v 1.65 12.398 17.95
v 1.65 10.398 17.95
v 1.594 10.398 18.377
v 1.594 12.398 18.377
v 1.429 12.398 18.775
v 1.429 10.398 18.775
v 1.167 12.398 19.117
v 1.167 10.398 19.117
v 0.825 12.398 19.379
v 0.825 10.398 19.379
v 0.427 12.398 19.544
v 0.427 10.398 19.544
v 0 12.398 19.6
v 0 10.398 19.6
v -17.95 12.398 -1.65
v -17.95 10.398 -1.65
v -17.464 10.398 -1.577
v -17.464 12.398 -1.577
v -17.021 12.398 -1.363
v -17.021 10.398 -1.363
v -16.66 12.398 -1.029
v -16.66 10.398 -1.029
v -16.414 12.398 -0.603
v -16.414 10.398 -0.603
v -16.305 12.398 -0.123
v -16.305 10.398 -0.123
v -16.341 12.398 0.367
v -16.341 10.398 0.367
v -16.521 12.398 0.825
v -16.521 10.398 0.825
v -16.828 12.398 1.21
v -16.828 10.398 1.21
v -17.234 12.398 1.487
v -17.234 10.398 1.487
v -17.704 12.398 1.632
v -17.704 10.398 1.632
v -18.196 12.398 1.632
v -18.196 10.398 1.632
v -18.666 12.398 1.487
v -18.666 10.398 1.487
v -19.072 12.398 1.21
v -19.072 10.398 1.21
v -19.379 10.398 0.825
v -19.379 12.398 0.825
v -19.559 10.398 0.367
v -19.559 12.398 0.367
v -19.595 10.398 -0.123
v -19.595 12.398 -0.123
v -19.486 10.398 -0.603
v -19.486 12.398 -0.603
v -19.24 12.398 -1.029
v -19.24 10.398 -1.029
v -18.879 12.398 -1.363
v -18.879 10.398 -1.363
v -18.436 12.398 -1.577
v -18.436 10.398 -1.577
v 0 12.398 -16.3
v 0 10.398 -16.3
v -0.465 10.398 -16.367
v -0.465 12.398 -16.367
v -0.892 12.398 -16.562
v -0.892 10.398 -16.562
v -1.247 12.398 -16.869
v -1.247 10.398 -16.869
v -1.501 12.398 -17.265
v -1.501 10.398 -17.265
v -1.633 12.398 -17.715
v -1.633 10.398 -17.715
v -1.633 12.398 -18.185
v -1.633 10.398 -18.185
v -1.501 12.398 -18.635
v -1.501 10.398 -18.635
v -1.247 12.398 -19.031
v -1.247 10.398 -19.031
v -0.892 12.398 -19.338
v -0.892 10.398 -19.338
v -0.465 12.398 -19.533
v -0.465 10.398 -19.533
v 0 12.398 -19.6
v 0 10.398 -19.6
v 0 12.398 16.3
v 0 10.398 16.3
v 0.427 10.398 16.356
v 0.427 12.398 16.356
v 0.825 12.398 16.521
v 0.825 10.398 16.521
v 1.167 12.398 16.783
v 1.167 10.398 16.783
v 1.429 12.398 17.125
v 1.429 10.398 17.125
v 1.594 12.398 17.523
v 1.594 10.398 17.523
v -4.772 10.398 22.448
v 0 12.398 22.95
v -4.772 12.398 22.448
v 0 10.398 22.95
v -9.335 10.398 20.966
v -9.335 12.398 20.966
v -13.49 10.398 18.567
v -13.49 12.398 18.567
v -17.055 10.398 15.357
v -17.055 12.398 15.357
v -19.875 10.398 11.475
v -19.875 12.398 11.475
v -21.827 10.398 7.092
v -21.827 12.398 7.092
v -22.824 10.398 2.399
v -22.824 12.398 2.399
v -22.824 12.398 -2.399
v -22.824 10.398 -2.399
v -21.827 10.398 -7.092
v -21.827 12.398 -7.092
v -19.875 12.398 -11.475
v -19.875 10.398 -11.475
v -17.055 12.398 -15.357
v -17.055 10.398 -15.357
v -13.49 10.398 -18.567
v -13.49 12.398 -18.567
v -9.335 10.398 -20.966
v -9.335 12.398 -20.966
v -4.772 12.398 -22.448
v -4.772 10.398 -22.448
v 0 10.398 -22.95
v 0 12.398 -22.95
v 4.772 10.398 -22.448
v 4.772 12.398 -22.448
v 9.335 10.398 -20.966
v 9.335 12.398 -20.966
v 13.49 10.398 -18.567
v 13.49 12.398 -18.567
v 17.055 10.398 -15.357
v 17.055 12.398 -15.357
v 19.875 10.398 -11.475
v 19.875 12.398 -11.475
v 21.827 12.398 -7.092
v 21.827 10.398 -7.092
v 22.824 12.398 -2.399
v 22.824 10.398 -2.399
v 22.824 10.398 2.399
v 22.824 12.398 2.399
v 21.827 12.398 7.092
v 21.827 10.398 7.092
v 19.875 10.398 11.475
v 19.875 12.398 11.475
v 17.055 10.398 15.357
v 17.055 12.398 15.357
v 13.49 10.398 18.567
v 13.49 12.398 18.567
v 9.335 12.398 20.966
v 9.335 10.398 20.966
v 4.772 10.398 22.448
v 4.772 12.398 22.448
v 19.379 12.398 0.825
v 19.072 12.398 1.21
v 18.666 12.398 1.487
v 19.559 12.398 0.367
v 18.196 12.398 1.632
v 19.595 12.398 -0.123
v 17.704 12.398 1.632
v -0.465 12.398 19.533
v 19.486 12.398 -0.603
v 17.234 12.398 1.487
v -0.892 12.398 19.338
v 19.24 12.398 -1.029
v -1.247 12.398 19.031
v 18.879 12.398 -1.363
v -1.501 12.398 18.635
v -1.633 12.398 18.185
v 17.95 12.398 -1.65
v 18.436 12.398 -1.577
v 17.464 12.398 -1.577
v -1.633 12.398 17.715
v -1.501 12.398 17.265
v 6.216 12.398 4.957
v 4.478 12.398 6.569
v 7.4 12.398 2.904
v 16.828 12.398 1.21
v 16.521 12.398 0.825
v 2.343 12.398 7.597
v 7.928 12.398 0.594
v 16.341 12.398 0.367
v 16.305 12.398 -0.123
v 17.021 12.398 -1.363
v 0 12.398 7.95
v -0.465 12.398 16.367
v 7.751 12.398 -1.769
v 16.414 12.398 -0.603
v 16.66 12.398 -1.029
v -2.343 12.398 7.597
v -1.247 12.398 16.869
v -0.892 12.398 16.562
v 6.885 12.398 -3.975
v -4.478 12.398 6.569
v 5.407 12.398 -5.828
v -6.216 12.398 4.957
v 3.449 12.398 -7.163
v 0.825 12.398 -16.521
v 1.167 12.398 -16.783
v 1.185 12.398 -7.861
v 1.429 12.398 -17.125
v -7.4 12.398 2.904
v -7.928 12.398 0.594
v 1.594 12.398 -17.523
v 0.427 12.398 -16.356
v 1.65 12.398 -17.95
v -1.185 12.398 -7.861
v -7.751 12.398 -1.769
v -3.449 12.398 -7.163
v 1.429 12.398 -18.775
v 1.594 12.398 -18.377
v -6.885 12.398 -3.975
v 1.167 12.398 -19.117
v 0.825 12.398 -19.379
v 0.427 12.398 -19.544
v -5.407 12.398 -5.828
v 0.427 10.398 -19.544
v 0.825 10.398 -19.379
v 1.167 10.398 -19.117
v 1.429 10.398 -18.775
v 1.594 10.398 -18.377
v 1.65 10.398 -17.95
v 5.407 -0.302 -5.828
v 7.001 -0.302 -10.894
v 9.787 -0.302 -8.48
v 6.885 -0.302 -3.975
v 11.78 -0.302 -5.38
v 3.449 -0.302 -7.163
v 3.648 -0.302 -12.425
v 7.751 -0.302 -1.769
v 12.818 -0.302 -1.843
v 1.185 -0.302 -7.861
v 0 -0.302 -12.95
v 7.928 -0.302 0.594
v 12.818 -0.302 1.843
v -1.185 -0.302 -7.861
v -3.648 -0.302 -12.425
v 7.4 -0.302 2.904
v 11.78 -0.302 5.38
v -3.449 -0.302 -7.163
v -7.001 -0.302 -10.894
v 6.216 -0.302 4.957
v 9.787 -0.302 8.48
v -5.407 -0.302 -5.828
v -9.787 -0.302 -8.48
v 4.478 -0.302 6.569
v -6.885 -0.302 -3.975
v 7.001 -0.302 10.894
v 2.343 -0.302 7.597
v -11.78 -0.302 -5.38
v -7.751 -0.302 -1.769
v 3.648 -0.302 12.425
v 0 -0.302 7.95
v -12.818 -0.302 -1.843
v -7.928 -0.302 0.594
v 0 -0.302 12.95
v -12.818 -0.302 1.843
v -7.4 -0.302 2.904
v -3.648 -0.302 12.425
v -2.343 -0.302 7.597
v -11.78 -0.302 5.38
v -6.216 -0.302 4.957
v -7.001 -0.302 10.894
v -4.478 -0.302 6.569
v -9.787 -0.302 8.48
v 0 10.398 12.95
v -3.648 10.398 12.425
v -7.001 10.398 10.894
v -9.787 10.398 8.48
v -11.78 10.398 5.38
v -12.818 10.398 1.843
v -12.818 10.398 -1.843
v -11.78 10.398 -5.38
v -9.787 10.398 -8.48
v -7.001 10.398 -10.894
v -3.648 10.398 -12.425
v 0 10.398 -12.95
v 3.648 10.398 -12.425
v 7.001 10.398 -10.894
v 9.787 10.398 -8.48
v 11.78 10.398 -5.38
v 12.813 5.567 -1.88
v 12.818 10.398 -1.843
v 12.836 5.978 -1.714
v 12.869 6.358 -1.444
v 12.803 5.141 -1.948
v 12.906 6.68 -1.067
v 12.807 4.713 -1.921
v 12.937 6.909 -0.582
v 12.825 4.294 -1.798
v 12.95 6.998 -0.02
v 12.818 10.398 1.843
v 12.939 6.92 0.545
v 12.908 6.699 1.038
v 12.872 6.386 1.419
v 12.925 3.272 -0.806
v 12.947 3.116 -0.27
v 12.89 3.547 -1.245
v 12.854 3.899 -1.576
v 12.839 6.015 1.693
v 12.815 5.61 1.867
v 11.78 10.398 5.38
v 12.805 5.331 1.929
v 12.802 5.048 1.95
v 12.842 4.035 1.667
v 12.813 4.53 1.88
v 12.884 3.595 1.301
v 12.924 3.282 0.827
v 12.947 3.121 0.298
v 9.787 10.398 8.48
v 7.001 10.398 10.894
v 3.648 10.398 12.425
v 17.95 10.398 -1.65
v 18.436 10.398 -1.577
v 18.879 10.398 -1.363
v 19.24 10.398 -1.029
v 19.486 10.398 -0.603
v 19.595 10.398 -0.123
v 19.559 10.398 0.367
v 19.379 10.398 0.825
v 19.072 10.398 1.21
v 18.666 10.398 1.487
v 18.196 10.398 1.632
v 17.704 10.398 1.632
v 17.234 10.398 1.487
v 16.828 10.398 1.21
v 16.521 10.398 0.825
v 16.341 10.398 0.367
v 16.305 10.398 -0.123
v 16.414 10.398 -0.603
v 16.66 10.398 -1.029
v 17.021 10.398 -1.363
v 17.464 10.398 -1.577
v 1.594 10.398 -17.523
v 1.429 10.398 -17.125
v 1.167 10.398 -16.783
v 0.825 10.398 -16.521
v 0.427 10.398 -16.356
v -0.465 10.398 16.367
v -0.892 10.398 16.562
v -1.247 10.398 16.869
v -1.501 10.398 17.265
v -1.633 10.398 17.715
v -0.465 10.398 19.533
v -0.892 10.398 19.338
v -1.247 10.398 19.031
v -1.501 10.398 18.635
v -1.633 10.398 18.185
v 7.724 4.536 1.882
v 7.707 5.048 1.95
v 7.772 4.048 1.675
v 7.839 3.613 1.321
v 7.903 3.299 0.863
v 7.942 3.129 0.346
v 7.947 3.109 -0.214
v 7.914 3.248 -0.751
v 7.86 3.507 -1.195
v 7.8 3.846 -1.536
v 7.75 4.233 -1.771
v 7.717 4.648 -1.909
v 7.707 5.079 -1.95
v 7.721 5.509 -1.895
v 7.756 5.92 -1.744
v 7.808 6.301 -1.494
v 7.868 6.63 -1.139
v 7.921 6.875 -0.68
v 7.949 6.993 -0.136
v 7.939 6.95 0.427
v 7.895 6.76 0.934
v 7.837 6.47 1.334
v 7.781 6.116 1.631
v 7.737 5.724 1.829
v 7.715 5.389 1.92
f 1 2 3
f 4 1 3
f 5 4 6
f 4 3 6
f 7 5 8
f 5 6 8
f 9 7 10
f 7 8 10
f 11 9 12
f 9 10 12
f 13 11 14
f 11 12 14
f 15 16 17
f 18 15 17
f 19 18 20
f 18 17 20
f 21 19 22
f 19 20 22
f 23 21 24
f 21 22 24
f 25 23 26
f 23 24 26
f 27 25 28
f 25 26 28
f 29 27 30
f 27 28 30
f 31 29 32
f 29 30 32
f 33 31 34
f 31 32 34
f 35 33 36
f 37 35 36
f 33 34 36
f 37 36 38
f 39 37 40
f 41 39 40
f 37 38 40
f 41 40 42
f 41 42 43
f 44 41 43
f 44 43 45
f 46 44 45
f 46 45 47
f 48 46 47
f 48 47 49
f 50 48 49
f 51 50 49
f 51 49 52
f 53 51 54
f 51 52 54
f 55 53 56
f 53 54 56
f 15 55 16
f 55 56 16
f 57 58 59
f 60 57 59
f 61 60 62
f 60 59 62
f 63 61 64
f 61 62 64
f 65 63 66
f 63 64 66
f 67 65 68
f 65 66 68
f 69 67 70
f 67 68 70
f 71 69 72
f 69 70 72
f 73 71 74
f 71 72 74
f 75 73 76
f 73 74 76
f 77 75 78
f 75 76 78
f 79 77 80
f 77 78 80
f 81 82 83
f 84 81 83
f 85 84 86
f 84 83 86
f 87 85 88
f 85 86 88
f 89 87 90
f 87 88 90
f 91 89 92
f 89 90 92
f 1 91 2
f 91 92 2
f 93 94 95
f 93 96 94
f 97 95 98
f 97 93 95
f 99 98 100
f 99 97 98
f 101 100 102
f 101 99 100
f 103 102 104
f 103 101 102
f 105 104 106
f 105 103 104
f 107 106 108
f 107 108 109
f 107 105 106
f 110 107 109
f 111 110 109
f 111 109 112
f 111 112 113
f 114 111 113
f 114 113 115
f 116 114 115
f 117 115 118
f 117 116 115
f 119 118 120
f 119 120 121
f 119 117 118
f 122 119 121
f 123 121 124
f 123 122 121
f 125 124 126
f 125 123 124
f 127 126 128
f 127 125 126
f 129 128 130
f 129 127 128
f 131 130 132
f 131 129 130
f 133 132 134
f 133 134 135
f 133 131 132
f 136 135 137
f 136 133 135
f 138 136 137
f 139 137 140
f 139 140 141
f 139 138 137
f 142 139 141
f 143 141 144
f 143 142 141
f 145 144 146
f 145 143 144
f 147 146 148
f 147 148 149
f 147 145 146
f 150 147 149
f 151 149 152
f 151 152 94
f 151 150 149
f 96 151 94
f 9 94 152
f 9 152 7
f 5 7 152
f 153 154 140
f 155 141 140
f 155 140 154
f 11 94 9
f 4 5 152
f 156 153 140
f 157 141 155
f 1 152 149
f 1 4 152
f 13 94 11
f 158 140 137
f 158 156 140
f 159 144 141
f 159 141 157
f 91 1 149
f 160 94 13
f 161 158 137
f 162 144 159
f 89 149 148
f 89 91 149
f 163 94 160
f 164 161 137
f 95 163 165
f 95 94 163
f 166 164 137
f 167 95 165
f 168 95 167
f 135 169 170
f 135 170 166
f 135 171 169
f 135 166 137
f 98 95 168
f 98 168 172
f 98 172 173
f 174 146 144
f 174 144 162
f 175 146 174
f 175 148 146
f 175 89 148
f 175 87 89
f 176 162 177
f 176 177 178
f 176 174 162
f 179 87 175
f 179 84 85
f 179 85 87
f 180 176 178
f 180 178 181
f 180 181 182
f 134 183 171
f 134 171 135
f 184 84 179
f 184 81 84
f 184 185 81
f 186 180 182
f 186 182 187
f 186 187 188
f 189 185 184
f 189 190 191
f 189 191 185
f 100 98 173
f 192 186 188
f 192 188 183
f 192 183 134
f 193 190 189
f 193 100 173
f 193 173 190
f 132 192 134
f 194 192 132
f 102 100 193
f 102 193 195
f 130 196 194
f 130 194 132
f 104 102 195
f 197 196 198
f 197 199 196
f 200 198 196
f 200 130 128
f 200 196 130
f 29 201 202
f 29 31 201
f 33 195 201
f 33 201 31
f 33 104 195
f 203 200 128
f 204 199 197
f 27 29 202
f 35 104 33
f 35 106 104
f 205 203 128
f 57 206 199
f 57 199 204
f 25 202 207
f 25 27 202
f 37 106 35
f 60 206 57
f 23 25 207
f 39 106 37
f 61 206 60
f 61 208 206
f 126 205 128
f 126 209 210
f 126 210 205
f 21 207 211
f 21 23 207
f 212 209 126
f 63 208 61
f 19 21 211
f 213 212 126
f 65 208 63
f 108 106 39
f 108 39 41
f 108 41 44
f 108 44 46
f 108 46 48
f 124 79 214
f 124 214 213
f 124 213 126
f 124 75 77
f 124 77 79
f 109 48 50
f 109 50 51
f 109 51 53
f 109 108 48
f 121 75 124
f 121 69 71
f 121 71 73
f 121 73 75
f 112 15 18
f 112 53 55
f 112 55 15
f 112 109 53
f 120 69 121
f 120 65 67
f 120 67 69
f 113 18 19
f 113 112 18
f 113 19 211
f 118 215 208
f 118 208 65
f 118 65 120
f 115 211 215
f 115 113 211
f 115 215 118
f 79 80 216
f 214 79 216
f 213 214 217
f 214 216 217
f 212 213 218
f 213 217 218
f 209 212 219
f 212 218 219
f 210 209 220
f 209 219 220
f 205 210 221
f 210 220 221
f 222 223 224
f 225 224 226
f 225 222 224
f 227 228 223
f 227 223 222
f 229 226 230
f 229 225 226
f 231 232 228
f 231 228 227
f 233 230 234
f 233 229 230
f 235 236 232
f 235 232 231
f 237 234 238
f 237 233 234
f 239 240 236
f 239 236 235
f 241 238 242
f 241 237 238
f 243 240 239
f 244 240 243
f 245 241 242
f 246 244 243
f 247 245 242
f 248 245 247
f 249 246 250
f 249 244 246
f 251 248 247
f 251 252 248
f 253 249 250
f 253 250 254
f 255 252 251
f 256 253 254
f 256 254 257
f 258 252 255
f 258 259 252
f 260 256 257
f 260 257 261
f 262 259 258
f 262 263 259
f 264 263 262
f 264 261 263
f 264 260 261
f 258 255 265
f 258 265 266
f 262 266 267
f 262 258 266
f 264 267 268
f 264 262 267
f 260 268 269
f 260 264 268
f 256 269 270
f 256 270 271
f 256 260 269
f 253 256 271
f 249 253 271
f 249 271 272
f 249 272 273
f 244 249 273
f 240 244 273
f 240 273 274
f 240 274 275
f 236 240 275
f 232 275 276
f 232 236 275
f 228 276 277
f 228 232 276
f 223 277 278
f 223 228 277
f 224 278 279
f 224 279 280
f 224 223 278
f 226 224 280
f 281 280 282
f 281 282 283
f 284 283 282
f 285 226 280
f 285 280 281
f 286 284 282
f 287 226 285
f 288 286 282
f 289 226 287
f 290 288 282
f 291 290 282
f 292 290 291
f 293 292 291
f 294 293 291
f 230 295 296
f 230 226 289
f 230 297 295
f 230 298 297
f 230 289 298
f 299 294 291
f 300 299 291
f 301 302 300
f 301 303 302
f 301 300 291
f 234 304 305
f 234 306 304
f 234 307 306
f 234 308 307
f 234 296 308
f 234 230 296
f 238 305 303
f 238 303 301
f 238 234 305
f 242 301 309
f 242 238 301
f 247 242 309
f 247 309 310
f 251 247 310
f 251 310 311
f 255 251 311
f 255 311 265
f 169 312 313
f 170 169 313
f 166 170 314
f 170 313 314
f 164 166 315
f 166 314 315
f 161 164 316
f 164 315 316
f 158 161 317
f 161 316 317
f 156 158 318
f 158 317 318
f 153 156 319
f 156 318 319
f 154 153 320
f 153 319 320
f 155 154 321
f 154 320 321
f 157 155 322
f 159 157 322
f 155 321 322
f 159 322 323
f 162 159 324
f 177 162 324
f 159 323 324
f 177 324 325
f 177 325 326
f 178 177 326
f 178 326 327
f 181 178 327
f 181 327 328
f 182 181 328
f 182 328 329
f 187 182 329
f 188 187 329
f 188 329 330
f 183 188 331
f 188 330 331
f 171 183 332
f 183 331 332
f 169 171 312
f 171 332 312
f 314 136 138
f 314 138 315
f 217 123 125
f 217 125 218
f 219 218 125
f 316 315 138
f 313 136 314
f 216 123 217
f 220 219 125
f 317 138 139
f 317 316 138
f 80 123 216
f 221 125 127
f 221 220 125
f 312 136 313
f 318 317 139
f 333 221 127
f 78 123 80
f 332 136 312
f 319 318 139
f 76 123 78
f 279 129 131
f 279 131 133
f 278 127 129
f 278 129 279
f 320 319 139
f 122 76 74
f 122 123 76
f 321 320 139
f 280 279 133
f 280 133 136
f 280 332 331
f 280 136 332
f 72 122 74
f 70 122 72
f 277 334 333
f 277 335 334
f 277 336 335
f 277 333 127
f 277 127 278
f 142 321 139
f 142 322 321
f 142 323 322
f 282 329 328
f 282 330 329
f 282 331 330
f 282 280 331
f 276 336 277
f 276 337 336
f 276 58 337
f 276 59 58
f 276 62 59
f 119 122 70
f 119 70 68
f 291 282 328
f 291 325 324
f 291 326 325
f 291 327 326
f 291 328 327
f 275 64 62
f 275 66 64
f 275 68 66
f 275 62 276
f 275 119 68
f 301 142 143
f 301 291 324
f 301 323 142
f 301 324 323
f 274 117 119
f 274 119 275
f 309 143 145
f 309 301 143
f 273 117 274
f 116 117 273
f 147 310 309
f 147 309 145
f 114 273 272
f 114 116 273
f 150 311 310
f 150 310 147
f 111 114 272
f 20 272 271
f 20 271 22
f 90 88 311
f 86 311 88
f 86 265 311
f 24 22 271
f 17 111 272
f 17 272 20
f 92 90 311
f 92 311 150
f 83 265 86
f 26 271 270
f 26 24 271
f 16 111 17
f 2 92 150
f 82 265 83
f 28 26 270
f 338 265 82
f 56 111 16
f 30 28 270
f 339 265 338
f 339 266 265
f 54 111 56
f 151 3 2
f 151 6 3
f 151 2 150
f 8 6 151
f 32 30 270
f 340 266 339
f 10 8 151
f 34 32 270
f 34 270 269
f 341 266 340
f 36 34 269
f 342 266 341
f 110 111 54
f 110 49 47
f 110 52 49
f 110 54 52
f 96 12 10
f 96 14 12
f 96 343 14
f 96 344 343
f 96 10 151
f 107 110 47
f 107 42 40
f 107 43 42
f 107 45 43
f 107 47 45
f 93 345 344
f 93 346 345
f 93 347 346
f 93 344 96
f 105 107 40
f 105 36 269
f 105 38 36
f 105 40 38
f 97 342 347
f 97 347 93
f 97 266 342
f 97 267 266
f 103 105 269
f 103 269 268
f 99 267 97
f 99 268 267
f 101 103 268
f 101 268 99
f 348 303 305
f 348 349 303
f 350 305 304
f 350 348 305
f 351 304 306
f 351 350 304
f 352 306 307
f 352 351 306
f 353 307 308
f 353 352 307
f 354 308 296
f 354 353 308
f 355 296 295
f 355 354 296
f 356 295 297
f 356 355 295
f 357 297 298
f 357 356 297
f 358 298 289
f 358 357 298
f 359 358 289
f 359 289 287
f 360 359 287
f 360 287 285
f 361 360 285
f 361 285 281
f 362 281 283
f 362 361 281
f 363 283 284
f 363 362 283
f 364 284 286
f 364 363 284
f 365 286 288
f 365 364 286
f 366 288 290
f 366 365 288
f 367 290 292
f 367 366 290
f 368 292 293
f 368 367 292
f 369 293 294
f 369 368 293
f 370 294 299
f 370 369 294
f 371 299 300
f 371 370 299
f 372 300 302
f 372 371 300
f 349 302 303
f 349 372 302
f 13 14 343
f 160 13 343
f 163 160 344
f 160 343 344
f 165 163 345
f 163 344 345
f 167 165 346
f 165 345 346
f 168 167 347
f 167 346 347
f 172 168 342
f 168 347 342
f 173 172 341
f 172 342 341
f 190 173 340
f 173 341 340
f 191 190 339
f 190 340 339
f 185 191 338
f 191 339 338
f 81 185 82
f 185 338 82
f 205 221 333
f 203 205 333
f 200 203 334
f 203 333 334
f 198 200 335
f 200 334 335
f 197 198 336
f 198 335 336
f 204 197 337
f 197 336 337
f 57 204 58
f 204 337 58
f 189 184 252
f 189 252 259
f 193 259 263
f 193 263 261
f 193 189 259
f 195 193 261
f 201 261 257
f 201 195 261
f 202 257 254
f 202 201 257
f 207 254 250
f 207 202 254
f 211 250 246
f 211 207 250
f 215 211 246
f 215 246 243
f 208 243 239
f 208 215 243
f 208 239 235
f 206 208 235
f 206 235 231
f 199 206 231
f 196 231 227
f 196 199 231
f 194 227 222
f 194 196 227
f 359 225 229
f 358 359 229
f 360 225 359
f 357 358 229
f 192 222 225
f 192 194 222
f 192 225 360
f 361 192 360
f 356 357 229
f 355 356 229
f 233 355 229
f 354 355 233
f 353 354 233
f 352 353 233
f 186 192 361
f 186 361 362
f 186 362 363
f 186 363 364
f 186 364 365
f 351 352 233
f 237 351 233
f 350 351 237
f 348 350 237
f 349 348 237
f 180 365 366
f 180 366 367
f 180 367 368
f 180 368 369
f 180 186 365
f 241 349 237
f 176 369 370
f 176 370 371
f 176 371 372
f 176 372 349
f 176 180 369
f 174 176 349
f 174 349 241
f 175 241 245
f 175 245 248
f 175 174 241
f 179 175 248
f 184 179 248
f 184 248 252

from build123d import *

# Parameters (mm, degrees)
SKETCH6_R          = 1.65
CUT_EXTRUDE1_DEPTH = 2


with BuildPart() as part:
    # Sketch1 → Revolve1 (revolve)
    with BuildSketch(Plane.XY, mode=Mode.PRIVATE) as revolve1_sk:
        Polygon((-7.95, 12.397619048), (-22.95, 12.397619048), (-22.95, 10.397619048), (-12.95, 10.397619048), (-12.95, -0.302380952), (-7.95, -0.302380952), align=None)
    revolve(revolve1_sk.sketch.rotate(Axis((0, 15.542380952, 0), (0, -1, 0)), 270), axis=Axis((0, 15.542380952, 0), (0, -1, 0)))

    # Sketch5 → M3.5 Clearance Hole1 (revolve, cut)
    with BuildSketch(Plane.ZX.offset(5.047619048)):
        Polygon((0, 0), (0, 15.141678207), (1.95, 13.97), (1.95, 0), align=None)
    revolve(axis=Axis((-6.35, 5.047619048, 0), (1, 0, 0)), mode=Mode.SUBTRACT)

    # Sketch6 → Cut-Extrude1 (cut)
    with BuildSketch(Plane.XZ.offset(-10.397619048)):
        with BuildLine():
            ThreePointArc((1.65, 17.95), (1.166726189, 19.116726189), (0, 19.6))
            Line((0, 19.6), (0, 16.3))
            ThreePointArc((0, 16.3), (1.166726189, 16.783273811), (1.65, 17.95))
        make_face()
        with BuildLine():
            Line((0, 16.3), (0, 19.6))
            ThreePointArc((0, 19.6), (-1.65, 17.95), (0, 16.3))
        make_face()
        with Locations(Location((17.95, 0, 0), (0, 0, 270))):
            Circle(SKETCH6_R)
        with BuildLine():
            ThreePointArc((1.65, -17.95), (1.166726189, -16.783273811), (0, -16.3))
            Line((0, -16.3), (0, -19.6))
            ThreePointArc((0, -19.6), (1.166726189, -19.116726189), (1.65, -17.95))
        make_face()
        with BuildLine():
            Line((0, -19.6), (0, -16.3))
            ThreePointArc((0, -16.3), (-1.65, -17.95), (0, -19.6))
        make_face()
        with Locations(Location((-17.95, 0, 0), (0, 0, 270))):
            Circle(SKETCH6_R)
    extrude(amount=-CUT_EXTRUDE1_DEPTH, mode=Mode.SUBTRACT)


solid = part.part
